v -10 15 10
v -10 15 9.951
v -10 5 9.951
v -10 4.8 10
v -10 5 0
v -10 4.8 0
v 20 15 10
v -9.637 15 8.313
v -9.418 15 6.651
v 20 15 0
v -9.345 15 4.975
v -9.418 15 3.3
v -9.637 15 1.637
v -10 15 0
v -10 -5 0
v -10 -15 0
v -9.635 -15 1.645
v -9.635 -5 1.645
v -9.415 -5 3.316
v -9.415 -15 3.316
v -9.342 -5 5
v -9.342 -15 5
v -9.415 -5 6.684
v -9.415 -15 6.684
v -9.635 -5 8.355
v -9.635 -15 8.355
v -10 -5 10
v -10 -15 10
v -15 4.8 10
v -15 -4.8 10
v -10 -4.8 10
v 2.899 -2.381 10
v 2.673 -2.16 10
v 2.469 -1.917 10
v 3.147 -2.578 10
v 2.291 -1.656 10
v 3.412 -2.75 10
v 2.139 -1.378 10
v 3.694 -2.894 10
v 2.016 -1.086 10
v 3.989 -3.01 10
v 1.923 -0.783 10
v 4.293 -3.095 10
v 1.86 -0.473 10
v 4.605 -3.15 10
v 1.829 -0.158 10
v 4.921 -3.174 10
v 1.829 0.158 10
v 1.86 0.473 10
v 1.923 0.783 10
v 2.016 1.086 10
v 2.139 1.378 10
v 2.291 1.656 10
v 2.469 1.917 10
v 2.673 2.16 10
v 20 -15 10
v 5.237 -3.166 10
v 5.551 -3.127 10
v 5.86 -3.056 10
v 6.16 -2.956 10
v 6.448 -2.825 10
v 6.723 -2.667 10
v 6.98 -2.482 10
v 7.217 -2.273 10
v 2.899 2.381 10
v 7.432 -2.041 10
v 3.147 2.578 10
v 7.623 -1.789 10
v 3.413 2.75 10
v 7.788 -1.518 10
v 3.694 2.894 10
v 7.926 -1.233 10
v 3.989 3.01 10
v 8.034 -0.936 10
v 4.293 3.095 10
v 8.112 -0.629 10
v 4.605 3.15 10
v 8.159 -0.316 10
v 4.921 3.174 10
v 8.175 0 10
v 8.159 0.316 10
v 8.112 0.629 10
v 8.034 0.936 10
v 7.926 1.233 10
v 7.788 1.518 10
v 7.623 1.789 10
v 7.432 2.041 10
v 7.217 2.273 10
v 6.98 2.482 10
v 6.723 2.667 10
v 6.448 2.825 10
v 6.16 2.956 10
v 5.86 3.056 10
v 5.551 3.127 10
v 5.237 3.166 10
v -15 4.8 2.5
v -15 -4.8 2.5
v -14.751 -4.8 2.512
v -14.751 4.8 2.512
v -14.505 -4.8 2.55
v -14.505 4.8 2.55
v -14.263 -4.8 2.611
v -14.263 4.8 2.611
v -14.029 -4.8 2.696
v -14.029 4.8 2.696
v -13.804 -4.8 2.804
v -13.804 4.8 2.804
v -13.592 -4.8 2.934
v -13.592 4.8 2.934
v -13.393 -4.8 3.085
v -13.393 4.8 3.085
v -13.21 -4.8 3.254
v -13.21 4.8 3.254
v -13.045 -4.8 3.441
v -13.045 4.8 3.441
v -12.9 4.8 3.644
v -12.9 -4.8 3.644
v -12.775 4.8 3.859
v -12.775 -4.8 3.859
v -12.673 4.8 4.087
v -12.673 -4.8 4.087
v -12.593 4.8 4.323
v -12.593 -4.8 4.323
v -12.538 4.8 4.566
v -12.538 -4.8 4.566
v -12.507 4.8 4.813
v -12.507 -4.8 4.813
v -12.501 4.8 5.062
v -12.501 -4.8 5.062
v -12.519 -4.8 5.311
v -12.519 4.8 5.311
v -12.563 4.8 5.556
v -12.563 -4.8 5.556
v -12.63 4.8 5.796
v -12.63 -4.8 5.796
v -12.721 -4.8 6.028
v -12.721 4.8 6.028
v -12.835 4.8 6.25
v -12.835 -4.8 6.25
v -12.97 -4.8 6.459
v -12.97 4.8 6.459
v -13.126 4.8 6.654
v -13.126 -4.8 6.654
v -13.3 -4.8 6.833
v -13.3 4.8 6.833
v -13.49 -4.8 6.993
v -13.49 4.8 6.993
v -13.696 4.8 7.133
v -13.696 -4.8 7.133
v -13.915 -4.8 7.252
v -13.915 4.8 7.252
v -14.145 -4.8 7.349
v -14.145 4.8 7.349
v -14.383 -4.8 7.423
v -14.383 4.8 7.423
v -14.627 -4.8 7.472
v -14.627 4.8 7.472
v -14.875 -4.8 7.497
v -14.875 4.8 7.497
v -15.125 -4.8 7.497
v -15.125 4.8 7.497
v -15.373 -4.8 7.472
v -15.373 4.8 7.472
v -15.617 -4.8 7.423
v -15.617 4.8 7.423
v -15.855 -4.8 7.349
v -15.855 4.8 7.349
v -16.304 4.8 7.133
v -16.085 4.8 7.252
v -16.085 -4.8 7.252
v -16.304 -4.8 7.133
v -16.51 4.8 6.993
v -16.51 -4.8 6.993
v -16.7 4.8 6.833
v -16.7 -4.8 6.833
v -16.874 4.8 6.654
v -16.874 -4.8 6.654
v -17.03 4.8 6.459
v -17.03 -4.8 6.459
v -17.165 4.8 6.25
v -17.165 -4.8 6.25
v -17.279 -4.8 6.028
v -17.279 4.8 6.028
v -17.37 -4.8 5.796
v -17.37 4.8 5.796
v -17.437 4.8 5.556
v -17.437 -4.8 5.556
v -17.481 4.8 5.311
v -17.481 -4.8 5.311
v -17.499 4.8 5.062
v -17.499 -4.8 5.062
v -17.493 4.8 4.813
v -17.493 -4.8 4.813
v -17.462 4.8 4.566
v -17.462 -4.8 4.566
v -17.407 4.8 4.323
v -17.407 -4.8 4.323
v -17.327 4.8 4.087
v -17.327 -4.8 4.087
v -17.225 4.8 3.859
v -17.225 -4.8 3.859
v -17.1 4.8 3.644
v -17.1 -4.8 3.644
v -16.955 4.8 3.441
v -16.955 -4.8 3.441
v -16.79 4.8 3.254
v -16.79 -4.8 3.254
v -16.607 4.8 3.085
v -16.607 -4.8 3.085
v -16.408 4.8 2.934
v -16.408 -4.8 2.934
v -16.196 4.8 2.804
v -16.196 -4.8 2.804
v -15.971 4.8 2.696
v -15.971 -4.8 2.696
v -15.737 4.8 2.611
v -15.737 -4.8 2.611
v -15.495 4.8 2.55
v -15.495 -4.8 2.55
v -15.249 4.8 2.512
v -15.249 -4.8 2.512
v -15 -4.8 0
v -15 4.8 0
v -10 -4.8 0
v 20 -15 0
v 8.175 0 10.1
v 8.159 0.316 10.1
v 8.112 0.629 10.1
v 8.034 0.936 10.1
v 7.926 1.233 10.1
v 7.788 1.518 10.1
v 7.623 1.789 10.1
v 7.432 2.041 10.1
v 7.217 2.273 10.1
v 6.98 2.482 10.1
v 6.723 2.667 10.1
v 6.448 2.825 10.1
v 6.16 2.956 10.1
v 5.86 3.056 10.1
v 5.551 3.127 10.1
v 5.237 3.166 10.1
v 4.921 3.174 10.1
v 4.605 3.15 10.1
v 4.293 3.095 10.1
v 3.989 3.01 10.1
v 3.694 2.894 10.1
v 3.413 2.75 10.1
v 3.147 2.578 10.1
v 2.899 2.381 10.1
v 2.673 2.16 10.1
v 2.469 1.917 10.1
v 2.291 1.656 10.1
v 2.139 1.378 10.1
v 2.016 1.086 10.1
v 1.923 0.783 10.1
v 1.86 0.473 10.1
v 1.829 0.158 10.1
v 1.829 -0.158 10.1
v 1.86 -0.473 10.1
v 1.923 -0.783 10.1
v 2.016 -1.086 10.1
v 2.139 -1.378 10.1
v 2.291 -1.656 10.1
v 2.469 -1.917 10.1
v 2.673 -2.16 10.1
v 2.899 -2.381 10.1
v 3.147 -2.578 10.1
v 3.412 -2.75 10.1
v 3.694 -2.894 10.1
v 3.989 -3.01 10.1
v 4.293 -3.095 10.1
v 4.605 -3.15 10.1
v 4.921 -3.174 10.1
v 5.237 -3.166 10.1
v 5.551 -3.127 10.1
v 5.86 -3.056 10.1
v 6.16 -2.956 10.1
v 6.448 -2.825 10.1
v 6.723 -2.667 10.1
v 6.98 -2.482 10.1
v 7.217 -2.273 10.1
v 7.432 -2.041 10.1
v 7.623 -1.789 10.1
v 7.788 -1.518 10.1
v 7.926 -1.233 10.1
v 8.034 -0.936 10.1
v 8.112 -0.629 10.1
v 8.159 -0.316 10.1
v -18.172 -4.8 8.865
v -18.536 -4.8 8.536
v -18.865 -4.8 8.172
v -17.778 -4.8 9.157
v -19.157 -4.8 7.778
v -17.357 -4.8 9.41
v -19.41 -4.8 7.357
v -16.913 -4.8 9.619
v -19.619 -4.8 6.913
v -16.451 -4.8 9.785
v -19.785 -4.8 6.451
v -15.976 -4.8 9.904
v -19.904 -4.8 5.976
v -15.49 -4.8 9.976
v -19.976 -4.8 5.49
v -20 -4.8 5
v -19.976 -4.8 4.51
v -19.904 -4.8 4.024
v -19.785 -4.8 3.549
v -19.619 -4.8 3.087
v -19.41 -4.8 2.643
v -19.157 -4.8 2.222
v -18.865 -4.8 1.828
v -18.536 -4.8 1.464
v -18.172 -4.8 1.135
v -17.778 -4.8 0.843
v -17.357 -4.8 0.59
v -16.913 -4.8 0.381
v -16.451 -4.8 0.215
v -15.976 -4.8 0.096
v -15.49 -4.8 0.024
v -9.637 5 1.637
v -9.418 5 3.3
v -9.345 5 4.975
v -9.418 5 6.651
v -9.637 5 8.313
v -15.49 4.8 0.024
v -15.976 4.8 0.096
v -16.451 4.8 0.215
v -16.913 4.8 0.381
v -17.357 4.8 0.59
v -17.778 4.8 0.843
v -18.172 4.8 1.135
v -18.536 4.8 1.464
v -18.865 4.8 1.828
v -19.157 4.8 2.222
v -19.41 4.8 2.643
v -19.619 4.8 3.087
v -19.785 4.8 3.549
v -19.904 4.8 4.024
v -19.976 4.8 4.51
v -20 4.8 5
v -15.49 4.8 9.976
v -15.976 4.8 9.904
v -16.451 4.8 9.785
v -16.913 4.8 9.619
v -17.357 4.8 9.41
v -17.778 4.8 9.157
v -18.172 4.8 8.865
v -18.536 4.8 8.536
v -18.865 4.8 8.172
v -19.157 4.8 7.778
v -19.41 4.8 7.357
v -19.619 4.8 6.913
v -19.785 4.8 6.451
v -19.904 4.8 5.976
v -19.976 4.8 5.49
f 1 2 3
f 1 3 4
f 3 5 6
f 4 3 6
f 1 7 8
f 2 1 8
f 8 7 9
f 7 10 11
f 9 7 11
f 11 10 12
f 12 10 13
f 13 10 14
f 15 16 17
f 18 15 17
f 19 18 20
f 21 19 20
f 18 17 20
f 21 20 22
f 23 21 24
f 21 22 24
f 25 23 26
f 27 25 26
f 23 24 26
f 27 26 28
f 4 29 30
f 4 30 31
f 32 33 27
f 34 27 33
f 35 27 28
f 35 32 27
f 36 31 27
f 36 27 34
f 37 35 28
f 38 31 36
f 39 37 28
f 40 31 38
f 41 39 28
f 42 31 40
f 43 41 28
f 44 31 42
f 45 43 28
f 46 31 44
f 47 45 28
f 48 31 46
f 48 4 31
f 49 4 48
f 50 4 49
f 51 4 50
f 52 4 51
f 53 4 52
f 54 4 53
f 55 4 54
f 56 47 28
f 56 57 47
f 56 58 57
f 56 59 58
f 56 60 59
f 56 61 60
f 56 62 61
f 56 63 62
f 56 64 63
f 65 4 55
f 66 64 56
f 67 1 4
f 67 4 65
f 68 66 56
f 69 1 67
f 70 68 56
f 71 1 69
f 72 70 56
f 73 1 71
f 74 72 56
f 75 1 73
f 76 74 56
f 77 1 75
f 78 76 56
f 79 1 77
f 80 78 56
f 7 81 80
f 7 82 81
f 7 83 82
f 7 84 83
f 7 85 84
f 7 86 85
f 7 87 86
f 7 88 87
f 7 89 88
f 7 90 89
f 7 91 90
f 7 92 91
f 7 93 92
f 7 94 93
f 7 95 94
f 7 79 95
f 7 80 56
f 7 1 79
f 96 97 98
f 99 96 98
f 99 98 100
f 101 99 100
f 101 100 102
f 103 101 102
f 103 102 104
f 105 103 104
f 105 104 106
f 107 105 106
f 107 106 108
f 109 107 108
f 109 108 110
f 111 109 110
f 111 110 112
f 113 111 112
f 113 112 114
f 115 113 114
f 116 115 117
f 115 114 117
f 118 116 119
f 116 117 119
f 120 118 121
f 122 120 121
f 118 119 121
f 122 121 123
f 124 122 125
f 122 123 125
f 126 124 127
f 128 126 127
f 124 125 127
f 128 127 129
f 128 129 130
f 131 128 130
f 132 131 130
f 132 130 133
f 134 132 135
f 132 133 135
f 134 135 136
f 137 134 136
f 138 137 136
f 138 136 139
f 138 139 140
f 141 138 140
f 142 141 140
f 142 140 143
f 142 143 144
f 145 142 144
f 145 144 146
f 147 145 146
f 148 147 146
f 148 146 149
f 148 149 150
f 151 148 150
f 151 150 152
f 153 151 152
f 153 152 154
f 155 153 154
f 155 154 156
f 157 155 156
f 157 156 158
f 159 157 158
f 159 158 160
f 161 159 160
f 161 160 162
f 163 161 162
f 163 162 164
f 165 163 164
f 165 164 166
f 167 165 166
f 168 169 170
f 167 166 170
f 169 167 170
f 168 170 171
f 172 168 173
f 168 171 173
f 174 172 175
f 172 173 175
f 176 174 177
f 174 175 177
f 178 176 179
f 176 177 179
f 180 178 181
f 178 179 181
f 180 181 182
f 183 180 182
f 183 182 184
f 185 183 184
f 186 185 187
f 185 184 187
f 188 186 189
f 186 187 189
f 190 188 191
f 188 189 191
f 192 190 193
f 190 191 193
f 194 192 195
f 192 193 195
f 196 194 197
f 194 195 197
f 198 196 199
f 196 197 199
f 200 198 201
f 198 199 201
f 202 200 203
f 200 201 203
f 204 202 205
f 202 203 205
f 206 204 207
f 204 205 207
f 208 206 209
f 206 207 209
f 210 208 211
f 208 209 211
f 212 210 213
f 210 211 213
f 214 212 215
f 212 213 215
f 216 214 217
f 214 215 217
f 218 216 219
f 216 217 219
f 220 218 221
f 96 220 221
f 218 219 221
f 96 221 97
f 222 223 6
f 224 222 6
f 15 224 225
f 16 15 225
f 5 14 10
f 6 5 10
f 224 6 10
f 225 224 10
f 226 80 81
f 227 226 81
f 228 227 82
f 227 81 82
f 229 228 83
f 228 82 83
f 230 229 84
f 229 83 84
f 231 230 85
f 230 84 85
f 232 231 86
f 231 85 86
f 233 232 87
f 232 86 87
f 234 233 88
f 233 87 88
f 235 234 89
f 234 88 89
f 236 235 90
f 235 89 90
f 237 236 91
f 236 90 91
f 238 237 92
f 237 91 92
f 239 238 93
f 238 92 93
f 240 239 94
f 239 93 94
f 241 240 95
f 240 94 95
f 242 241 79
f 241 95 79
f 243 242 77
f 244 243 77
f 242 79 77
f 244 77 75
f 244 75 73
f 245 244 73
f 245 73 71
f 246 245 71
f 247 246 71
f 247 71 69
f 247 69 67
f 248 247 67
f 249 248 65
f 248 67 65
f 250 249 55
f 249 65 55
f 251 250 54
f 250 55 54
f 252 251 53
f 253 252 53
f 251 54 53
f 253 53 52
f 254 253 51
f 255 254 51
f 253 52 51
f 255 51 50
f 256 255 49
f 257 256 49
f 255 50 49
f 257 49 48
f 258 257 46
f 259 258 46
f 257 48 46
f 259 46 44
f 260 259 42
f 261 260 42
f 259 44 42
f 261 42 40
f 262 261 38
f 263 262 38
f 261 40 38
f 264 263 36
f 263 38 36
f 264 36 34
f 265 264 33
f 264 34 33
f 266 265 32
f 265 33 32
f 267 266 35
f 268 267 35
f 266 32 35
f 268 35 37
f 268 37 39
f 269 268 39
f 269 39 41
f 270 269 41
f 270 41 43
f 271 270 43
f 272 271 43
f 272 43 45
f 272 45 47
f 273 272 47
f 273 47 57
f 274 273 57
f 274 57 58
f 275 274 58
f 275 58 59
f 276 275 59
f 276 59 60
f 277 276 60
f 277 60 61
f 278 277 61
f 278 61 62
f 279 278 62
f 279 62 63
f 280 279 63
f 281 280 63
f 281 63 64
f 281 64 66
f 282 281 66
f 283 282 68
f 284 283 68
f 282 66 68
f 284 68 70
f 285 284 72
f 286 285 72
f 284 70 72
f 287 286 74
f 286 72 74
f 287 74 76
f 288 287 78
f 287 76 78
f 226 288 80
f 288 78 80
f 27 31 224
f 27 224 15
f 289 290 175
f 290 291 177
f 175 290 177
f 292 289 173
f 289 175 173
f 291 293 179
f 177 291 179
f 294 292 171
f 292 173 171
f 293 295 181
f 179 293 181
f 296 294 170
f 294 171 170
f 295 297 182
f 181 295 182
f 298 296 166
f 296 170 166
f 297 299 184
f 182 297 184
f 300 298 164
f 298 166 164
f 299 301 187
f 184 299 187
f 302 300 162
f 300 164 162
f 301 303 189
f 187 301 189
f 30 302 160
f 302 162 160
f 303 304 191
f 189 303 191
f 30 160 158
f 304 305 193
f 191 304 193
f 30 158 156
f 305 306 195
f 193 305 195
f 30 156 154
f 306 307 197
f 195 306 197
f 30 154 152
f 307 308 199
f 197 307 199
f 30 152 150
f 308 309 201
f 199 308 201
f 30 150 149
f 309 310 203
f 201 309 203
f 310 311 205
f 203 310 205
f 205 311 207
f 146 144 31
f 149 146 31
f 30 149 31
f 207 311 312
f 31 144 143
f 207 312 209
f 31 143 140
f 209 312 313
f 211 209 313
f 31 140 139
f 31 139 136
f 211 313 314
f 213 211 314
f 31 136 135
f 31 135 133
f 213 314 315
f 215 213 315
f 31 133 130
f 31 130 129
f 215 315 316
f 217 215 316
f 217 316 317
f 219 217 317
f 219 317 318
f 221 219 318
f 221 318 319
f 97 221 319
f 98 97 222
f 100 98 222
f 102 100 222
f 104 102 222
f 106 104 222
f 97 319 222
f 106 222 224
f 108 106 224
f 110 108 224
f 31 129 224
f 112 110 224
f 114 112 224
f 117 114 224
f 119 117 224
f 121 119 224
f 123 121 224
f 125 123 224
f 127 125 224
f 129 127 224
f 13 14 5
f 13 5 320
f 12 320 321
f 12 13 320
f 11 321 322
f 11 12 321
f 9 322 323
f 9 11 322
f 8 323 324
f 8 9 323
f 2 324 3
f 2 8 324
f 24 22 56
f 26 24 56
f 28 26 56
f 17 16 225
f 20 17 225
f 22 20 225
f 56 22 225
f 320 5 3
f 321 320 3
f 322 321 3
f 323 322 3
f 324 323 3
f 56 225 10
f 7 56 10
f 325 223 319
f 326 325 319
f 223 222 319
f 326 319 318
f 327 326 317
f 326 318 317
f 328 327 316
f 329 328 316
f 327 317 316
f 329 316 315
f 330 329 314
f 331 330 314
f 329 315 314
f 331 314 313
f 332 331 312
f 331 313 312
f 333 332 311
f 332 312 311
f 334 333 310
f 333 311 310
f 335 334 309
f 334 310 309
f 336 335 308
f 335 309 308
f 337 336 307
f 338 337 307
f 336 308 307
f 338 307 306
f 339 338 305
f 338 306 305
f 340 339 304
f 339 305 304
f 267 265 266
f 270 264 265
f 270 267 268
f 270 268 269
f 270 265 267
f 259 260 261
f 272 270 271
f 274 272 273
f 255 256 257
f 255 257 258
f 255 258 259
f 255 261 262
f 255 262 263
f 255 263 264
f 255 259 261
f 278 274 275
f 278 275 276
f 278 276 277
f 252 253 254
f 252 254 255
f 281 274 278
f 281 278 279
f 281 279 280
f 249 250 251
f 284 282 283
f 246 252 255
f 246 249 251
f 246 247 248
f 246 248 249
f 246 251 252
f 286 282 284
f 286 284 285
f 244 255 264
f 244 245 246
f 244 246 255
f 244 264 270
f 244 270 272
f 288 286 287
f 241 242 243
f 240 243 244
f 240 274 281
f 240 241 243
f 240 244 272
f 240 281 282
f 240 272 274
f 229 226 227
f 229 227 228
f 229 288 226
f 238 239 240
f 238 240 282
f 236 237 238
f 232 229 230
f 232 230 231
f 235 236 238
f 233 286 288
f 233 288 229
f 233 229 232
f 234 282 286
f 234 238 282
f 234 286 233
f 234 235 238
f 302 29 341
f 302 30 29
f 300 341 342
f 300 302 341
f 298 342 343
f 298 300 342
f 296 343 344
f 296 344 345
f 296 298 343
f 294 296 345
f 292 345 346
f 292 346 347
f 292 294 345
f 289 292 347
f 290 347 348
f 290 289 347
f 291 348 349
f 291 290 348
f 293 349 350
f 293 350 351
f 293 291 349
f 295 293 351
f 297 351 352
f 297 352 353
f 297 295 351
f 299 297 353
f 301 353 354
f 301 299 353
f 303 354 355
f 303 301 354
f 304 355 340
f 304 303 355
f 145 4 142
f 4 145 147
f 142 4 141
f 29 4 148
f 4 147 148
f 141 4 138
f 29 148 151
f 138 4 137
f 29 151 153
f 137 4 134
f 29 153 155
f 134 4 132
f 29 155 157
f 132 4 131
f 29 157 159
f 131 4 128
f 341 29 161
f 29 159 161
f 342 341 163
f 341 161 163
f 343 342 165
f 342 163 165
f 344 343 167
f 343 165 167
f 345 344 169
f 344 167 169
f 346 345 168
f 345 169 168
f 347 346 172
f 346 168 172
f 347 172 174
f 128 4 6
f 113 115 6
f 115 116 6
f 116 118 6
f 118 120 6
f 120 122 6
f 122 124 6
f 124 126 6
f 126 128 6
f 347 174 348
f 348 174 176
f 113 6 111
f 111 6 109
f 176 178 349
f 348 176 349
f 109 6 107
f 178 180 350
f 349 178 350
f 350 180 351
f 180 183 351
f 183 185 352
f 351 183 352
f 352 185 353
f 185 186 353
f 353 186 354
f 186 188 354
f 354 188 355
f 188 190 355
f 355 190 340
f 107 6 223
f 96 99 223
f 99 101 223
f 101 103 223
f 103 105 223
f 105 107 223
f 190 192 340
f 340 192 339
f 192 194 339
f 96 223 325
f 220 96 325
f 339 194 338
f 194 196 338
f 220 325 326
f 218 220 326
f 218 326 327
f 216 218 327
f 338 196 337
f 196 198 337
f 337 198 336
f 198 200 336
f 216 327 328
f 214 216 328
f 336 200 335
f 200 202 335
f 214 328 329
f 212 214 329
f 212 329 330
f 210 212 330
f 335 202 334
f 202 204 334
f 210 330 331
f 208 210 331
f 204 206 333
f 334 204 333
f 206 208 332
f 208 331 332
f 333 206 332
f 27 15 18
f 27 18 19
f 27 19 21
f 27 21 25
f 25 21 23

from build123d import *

# Parameters (mm, degrees)
RESSALTO_EXTRUS_O1_DEPTH = 10
ESBO_O2_R                = 2.5
CORTE_EXTRUS_O1_DEPTH    = 10
FILETE1_R                = 5
CORTE_EXTRUS_O4_DEPTH    = 10
CORTE_EXTRUS_O5_DEPTH    = 10
ESBO_O7_R                = 3.175
RESSALTO_EXTRUS_O2_DEPTH = 0.1


with BuildPart() as part:
    # Esboço1 → Ressalto-extrusão1 (new body)
    with BuildSketch(Plane.XY):
        Polygon((-10, -7.5), (20, 15), (-10, 15), (-10, 4.8), (-20, 4.8), (-20, -4.8), (-10, -4.8), align=None)
        Polygon((20, -15), (20, 15), (-10, -7.5), (-10, -15), align=None)
    extrude(amount=RESSALTO_EXTRUS_O1_DEPTH)

    # Esboço2 → Corte-extrusão1 (cut)
    with BuildSketch(Plane.XZ.offset(4.8)):
        with Locations(Location((-15, 5, 0), (0, 0, 270))):
            Circle(ESBO_O2_R)
    extrude(amount=-CORTE_EXTRUS_O1_DEPTH, mode=Mode.SUBTRACT)

    # Filete1
    filete1_edges = [part.edges().sort_by_distance(p)[0] for p in [
        (-20, 0, 0),
        (-20, 0, 10),
    ]]
    fillet(filete1_edges, radius=FILETE1_R - 0.0001)  # a hair under: the kernel refuses the full size

    # Esboço5 → Corte-extrusão4 (cut)
    with BuildSketch(Plane.XZ.offset(15)):
        with BuildLine():
            Line((-10, 10), (-10, 0))
            ThreePointArc((-10, 0), (-9.341737512, 5), (-10, 10))
        make_face()
    extrude(amount=-CORTE_EXTRUS_O4_DEPTH, mode=Mode.SUBTRACT)

    # Esboço6 → Corte-extrusão5 (cut)
    with BuildSketch(Plane(origin=(0, 15, 0), x_dir=(1, 0, 0), z_dir=(0, 1, 0))):
        with BuildLine():
            Line((-10, -9.950546275), (-10, 0))
            ThreePointArc((-10, 0), (-9.344992865, -4.975273137), (-10, -9.950546275))
        make_face()
    extrude(amount=-CORTE_EXTRUS_O5_DEPTH, mode=Mode.SUBTRACT)

    # Esboço7 → Ressalto-extrusão2 (add)
    with BuildSketch(Plane.XY.offset(10)):
        with Locations((5, 0)):
            Circle(ESBO_O7_R)
    extrude(amount=RESSALTO_EXTRUS_O2_DEPTH)


solid = part.part
